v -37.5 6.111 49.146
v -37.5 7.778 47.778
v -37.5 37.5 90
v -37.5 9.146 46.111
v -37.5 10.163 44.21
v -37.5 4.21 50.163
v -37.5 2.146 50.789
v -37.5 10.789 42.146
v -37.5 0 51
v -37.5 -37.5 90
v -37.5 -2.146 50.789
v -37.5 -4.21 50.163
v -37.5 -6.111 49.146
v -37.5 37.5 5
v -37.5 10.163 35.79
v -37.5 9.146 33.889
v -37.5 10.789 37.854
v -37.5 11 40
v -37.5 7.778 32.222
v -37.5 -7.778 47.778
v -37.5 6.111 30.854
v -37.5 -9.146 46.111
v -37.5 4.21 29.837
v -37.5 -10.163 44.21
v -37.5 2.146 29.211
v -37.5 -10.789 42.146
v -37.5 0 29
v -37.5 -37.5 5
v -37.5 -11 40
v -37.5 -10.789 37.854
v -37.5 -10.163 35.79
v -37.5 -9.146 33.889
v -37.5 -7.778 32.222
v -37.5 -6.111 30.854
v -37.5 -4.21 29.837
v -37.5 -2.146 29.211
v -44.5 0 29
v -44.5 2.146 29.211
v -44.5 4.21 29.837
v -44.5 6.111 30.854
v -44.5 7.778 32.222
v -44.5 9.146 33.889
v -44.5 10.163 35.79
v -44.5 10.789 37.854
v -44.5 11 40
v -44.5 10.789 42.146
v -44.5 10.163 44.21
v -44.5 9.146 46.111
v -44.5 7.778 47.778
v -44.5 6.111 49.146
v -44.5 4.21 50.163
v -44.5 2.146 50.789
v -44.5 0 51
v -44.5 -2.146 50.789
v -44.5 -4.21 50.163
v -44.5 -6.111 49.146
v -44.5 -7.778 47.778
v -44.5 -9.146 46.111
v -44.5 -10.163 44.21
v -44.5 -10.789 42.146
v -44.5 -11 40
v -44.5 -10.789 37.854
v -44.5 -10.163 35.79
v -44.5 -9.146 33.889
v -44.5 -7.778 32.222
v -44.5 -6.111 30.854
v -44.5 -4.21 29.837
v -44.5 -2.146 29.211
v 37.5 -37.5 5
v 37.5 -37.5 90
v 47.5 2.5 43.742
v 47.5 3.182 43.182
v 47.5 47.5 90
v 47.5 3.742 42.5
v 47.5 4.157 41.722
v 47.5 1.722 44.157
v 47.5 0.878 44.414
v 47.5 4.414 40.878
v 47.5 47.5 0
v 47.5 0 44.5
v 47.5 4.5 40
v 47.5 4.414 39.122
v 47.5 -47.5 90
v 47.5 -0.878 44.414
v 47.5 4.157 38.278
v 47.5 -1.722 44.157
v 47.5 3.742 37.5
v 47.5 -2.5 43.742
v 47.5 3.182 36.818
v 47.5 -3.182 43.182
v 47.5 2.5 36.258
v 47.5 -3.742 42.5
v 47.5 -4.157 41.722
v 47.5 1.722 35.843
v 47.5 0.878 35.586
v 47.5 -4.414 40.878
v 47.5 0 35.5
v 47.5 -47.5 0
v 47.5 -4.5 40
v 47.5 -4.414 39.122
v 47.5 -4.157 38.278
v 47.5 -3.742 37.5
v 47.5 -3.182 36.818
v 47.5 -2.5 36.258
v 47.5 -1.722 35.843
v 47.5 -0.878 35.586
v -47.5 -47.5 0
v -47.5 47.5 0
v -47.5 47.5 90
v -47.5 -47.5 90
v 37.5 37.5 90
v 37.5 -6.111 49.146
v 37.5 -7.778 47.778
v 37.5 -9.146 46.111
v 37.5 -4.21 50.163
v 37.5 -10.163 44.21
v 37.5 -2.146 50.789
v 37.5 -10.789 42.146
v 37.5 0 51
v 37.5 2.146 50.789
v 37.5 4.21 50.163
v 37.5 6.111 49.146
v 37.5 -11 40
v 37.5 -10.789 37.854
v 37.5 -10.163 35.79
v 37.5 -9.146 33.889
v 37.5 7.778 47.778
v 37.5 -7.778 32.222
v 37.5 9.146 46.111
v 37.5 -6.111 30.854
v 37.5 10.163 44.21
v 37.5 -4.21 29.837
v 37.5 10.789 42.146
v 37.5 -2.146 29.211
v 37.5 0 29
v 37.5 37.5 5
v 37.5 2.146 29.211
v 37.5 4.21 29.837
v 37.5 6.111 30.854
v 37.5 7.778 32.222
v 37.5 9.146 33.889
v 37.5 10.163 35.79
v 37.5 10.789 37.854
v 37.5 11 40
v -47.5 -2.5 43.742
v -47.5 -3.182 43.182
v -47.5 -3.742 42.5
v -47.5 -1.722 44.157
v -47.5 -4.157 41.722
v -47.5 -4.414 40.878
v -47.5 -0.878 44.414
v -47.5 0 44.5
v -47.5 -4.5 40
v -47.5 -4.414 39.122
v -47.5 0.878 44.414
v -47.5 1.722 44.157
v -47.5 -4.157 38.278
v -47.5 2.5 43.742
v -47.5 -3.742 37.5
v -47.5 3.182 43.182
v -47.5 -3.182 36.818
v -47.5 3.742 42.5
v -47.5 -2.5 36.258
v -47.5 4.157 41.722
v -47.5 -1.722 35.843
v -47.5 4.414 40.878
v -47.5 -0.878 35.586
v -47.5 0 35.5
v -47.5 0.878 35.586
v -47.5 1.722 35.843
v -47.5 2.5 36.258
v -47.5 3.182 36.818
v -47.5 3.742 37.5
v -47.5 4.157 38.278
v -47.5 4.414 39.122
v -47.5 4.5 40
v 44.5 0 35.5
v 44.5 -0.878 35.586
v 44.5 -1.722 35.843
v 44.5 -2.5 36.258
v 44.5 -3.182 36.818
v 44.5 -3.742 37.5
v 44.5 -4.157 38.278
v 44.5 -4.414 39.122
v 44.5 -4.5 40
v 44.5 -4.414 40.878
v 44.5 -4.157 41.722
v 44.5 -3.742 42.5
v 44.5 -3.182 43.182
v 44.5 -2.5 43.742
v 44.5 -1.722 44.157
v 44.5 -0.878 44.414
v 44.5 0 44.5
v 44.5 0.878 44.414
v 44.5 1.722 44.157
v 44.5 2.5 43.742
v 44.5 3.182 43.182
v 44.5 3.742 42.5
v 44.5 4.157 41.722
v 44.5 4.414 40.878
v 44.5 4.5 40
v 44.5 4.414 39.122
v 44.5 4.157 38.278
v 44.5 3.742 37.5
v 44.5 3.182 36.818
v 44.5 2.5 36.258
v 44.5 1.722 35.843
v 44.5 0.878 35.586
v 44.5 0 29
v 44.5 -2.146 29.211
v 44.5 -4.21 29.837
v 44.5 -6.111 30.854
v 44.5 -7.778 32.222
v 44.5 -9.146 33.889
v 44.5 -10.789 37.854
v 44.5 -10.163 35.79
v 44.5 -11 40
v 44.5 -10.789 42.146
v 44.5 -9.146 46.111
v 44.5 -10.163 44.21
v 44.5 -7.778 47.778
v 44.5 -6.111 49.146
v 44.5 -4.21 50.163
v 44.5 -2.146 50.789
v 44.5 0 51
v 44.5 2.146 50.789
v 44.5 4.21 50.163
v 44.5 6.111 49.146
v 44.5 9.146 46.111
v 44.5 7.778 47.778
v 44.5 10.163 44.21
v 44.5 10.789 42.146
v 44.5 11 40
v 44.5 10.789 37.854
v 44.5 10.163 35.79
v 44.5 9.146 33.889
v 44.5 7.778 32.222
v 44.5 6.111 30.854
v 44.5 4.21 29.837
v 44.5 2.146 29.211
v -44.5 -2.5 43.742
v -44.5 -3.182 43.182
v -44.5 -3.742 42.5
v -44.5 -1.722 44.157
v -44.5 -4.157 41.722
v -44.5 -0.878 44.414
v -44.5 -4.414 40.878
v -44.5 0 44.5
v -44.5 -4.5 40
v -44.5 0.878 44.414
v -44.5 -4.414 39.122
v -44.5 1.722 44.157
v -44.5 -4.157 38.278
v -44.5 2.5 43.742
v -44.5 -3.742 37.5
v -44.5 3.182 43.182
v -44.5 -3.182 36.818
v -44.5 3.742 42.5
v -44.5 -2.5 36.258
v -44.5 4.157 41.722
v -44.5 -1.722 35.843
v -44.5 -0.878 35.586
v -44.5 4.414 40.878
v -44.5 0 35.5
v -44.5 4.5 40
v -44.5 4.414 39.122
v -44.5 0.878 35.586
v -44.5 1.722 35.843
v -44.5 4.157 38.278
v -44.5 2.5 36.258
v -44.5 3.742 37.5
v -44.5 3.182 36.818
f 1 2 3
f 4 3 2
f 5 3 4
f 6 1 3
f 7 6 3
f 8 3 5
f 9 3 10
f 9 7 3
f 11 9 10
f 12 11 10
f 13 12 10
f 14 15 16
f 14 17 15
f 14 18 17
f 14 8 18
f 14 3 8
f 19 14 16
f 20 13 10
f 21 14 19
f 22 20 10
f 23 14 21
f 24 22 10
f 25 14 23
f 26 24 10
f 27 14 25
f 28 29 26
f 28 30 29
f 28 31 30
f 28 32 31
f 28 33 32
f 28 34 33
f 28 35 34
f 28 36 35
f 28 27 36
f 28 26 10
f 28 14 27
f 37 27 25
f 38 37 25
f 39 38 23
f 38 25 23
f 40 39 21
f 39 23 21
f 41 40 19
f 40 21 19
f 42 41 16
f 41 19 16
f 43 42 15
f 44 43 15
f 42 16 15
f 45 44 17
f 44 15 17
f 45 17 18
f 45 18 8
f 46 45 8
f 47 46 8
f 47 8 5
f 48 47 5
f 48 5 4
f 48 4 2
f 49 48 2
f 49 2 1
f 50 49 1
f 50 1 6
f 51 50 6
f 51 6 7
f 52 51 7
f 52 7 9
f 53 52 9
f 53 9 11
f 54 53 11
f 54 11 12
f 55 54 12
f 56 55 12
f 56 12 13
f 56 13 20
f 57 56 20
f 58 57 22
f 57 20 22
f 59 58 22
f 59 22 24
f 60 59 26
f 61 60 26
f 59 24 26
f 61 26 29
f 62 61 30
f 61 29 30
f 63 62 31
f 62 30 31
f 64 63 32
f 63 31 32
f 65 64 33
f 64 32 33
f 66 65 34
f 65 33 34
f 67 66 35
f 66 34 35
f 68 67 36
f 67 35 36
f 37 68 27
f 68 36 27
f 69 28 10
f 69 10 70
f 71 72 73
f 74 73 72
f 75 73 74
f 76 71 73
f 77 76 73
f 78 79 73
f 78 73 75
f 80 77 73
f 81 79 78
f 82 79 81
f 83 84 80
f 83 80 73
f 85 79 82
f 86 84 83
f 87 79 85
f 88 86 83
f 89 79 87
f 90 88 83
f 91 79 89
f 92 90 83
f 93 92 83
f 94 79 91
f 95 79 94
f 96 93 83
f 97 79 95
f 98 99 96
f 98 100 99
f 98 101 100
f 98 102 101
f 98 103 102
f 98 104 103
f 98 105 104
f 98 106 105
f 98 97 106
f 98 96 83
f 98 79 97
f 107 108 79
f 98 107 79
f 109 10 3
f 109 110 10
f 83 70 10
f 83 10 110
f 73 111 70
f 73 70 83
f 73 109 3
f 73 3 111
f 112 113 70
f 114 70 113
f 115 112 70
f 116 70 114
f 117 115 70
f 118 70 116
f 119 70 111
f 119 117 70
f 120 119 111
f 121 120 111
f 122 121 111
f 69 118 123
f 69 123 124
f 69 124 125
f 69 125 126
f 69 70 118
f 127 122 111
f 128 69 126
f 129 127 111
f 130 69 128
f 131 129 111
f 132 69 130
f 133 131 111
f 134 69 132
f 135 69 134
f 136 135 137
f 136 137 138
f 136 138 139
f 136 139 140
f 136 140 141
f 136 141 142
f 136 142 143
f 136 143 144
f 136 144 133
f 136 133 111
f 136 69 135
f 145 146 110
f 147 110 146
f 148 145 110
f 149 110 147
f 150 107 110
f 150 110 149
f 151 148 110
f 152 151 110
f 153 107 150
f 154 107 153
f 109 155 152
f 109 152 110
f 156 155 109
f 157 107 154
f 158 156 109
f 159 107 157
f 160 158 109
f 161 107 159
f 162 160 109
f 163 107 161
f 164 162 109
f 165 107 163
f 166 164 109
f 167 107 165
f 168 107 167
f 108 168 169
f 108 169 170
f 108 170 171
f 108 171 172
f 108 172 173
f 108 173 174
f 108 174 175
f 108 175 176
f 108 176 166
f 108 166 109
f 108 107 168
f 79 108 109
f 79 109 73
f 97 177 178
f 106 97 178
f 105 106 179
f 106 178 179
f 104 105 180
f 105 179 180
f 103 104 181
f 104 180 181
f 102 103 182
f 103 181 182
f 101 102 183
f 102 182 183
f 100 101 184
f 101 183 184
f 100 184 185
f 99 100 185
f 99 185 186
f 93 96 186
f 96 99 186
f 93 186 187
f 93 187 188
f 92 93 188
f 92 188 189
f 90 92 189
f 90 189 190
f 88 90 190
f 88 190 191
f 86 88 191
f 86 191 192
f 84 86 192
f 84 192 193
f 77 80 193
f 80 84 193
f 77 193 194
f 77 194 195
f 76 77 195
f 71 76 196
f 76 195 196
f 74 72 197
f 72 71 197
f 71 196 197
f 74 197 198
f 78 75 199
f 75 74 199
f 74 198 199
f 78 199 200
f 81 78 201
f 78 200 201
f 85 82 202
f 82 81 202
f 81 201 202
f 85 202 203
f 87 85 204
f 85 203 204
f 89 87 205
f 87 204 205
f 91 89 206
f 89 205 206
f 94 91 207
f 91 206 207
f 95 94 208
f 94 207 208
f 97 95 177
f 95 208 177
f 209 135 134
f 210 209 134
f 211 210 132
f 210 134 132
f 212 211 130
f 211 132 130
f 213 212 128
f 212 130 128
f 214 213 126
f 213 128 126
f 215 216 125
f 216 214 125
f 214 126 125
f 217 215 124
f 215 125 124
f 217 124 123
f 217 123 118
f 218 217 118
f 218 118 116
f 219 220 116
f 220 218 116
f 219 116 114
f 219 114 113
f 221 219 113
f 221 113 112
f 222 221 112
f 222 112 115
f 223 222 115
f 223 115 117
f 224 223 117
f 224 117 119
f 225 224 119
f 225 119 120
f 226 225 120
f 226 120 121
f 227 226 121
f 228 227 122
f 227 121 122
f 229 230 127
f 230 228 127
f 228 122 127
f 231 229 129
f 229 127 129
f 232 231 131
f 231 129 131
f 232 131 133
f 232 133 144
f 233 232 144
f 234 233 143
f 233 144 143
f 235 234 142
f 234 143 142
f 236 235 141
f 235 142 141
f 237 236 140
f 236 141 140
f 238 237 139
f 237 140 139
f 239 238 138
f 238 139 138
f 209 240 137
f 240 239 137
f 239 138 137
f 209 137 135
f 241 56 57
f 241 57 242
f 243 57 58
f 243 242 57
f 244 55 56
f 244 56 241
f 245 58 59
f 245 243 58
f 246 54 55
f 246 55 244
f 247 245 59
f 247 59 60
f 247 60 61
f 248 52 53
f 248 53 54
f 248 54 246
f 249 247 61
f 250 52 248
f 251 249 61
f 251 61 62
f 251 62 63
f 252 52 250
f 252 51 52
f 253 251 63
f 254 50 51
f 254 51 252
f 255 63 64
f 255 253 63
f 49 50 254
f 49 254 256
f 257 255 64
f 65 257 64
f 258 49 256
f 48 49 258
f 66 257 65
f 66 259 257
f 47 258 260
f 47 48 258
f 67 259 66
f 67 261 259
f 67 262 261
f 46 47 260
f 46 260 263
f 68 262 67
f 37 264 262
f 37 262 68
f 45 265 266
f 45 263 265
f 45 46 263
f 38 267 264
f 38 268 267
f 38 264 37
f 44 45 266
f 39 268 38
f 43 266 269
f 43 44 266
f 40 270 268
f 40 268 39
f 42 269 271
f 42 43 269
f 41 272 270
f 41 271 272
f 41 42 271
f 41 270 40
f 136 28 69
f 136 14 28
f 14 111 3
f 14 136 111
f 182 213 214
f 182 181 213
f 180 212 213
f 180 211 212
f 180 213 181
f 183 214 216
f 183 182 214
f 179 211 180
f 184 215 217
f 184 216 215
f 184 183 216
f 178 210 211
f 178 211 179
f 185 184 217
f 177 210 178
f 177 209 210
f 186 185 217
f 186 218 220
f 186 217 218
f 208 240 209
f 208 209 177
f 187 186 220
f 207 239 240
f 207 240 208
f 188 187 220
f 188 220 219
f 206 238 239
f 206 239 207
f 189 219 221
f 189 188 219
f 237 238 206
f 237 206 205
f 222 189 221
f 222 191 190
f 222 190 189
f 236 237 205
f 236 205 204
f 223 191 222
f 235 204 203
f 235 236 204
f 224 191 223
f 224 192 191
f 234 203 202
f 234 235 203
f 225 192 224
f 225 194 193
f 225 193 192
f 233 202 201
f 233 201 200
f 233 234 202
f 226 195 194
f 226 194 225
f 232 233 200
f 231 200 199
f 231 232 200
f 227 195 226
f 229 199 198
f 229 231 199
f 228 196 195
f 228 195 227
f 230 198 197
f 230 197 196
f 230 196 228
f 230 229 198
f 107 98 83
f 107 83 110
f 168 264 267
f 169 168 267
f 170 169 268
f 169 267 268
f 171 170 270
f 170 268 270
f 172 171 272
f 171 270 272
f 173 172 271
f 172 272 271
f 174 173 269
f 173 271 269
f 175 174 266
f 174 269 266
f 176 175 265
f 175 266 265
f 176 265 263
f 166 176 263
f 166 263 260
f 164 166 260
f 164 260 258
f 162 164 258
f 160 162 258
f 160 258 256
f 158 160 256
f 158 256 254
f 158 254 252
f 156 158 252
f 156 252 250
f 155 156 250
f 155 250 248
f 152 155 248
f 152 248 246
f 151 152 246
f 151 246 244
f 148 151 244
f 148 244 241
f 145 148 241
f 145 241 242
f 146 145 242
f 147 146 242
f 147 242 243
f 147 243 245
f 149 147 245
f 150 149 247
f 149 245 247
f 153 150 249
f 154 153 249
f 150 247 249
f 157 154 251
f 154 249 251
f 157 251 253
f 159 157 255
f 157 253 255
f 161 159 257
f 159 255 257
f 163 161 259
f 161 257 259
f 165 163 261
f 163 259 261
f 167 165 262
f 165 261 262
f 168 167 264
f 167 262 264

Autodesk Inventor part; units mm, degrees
ref_plane "YZ Plane" through (0, 0, 0) normal (1, 0, 0) x (0, 1, 0)
ref_plane "XZ Plane" through (0, 0, 0) normal (0, 1, 0) x (-1, 0, 0)
ref_plane "XY Plane" through (0, 0, 0) normal (0, 0, 1) x (1, 0, 0)
sketch "Sketch1" plane through (0, 0, 0) normal (0, 0, 1) x (1, 0, 0)
  line L0 (-37.5, -37.5) -> (37.5, -37.5)
  line L1 (37.5, -37.5) -> (37.5, 37.5)
  line L2 (37.5, 37.5) -> (-37.5, 37.5)
  line L3 (-37.5, 37.5) -> (-37.5, -37.5)
  line L4 (-37.5, -37.5) -> (37.5, 37.5) construction
  line L5 (37.5, -37.5) -> (-37.5, 37.5) construction
  line L6 (47.5, 47.5) -> (47.5, -47.5)
  line L7 (47.5, -47.5) -> (-47.5, -47.5)
  line L8 (-47.5, -47.5) -> (-47.5, 47.5)
  line L9 (-47.5, 47.5) -> (47.5, 47.5)
  point P0 (0, 0)
  dimension "d0" = 75
  dimension "d1" = 75
  dimension "d2" = 10
extrude "Extrusion1" add sketch "Sketch1" along normal blind 5 contours L3 L2 L1 L0 | L6 L7 L8 L9
extrude "Extrusion2" add sketch "Sketch1" along normal blind 90
sketch "Sketch5" plane through (-37.5, -37.5, 5) normal (1, 0, 0) x (0, 0, -1)
  circle A0 centre (-35, 37.5) radius 11
  line L0 (5, 85) -> (5, -10) projected
  circle A1 centre (-35, 37.5) radius 4.5
  point P0 (5, 37.5)
  point P1 (5, 37.5)
  dimension "d16" = 22
  dimension "d17" = 40
  dimension "d18" = 9
extrude "Extrusion5" cut sketch "Sketch5" against normal blind 7
extrude "Extrusion6" cut sketch "Sketch5" against normal up to surface (10 mm away) contours A1
mirror "Mirror2" about plane through (0, 0, 0) normal (1, 0, 0) of "Extrusion6", "Extrusion5"
properties part number "draaideel voor endeffector"
